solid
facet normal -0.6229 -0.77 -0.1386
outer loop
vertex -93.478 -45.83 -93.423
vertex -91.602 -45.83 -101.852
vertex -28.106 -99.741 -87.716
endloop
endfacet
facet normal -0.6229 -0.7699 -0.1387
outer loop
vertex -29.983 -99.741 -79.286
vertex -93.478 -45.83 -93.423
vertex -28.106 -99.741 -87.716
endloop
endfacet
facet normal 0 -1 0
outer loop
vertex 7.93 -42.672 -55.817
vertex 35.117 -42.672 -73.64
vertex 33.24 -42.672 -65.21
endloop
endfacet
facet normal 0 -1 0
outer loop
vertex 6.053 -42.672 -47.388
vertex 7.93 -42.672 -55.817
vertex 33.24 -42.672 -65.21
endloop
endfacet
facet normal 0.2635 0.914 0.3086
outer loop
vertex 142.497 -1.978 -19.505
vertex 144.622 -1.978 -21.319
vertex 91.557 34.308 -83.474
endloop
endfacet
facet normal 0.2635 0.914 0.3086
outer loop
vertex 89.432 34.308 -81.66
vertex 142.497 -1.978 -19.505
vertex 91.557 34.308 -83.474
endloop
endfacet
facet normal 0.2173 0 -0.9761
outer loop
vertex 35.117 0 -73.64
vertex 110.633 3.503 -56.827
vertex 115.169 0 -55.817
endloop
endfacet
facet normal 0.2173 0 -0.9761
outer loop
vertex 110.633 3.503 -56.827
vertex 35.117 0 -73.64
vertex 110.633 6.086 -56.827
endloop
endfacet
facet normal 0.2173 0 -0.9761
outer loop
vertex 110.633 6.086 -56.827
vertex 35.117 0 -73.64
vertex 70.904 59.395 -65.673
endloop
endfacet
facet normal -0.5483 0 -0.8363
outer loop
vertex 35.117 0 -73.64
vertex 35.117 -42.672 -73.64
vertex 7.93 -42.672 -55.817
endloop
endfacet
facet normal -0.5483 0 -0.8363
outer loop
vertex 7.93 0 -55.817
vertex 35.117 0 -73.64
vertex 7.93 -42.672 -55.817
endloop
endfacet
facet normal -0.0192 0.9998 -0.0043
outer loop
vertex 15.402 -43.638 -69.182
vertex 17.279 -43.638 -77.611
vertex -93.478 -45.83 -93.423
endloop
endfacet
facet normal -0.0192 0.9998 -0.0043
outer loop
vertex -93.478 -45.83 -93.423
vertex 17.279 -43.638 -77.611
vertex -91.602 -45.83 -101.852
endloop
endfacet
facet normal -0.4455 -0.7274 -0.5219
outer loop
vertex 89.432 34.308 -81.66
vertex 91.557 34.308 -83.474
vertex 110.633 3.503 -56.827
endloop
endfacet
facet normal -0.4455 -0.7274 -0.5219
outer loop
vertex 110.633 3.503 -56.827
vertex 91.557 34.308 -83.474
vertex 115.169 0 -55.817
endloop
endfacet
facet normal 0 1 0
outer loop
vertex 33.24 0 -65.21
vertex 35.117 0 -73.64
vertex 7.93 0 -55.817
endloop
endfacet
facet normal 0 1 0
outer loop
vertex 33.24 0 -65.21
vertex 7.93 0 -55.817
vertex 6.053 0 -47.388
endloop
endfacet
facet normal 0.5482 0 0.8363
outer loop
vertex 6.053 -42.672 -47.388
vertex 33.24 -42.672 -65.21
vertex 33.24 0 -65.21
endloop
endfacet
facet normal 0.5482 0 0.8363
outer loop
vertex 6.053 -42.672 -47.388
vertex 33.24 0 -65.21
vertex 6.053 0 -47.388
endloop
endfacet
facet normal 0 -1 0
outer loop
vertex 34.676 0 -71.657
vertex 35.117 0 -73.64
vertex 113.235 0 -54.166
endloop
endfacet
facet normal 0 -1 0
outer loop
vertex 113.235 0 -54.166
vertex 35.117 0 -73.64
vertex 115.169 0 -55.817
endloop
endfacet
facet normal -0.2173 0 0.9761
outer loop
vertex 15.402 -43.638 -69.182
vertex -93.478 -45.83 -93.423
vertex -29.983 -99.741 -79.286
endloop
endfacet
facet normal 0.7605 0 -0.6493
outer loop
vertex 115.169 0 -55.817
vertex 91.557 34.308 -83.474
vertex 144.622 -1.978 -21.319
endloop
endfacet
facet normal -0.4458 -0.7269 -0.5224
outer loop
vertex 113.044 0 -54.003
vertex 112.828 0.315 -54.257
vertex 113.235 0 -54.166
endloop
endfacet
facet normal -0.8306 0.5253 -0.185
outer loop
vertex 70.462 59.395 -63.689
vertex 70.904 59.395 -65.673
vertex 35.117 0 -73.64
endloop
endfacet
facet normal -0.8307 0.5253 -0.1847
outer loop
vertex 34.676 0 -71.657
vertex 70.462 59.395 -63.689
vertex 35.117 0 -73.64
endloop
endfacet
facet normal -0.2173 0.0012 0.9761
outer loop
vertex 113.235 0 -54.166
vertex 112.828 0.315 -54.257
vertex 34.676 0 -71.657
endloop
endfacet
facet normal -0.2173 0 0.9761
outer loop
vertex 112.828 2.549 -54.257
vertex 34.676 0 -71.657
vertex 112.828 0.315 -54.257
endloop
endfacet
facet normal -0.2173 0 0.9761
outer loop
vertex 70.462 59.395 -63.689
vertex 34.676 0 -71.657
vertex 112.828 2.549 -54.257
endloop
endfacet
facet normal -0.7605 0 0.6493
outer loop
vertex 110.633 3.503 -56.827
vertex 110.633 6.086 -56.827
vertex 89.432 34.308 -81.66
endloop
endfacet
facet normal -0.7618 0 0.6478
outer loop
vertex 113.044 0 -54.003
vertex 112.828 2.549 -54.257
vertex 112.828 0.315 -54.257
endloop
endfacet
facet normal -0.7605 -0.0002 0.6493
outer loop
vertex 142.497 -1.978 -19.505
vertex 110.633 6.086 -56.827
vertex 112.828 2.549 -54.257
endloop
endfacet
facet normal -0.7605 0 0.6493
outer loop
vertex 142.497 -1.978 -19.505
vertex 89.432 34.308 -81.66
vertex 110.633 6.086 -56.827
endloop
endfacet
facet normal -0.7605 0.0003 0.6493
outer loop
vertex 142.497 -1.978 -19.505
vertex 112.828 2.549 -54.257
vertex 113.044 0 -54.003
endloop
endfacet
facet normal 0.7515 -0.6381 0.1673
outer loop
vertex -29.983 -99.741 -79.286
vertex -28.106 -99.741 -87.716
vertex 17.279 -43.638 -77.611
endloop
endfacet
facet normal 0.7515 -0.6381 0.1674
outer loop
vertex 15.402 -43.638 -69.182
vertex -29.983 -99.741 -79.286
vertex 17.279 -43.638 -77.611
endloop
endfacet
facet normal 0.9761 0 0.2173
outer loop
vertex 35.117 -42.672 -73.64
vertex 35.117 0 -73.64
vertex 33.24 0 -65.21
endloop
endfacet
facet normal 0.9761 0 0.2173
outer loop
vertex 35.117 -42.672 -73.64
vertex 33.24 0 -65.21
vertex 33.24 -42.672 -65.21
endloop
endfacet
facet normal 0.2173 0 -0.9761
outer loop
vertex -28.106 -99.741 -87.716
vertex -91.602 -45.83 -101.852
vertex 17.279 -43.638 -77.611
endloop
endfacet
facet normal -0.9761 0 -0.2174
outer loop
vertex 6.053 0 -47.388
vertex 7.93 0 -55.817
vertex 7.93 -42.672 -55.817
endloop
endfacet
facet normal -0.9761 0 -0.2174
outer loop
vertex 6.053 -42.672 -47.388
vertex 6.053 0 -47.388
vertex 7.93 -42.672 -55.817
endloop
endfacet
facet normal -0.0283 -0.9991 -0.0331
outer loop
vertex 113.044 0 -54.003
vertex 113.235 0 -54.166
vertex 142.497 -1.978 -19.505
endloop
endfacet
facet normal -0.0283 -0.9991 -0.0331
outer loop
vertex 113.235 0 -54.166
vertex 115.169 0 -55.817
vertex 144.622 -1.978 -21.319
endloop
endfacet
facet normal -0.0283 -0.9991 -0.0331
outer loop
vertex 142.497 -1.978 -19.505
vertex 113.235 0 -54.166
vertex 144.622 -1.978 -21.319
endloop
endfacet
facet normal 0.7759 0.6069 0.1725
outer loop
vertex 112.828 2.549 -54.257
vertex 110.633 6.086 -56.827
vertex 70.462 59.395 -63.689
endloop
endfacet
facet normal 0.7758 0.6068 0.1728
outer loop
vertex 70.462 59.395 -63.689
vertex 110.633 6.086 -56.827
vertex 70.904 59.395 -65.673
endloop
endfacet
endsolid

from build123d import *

# Parameters (mm, degrees)
F1_E6_W  = 32.5085211131
F1_E6_H  = 42.672
F3_DEPTH = 8.636
F5_DEPTH = 2.032
F7_DEPTH = 2.794


with BuildPart() as f3:
    # F2 (on face) + F1_E6 (on explicit) → F3 (new body)
    with BuildSketch(Plane(origin=(17.2792129444, 0, -77.6114316477), x_dir=(0.9761011501, 0, 0.2173166925), z_dir=(-0.2173166925, 0, 0.9761011501))):
        Polygon((0, -43.6379054688), (-111.5465760231, -45.830283314), (-46.496912837, -99.7414588928), align=None)
    with BuildSketch(Plane(origin=(35.1171717048, 0, -73.6400336027), x_dir=(-0.8363188208, 0, 0.548243404), z_dir=(0.548243404, 0, 0.8363188208))):
        with Locations((16.2542605566, 21.336)):
            Rectangle(F1_E6_W, F1_E6_H)
    extrude(amount=F3_DEPTH, dir=(-0.2173166925, 0, 0.9761011501))


with BuildPart() as f5:
    # F4 (on face) → F5 (new body)
    with BuildSketch(Plane(origin=(17.2792129444, 0, -77.6114316477), x_dir=(0.9761011501, 0, 0.2173166925), z_dir=(-0.2173166925, 0, 0.9761011501))):
        Polygon((54.9373701215, 59.3950413167), (18.2747031485, 0), (100.2867293219, 0), align=None)
    extrude(amount=F5_DEPTH)

    # F6 (on face) → F7 (join)
    with BuildSketch(Plane(origin=(94.1781769889, 0, -80.4043797496), x_dir=(0, -1, 0), z_dir=(-0.7605311042, 0, 0.6493015013))):
        Polygon((1.9783186726, 77.6898695076), (-34.3080833554, -4.0362984873), (0, 32.3286296737), align=None)
    extrude(amount=F7_DEPTH)


solid = Compound([f3.part, f5.part])
